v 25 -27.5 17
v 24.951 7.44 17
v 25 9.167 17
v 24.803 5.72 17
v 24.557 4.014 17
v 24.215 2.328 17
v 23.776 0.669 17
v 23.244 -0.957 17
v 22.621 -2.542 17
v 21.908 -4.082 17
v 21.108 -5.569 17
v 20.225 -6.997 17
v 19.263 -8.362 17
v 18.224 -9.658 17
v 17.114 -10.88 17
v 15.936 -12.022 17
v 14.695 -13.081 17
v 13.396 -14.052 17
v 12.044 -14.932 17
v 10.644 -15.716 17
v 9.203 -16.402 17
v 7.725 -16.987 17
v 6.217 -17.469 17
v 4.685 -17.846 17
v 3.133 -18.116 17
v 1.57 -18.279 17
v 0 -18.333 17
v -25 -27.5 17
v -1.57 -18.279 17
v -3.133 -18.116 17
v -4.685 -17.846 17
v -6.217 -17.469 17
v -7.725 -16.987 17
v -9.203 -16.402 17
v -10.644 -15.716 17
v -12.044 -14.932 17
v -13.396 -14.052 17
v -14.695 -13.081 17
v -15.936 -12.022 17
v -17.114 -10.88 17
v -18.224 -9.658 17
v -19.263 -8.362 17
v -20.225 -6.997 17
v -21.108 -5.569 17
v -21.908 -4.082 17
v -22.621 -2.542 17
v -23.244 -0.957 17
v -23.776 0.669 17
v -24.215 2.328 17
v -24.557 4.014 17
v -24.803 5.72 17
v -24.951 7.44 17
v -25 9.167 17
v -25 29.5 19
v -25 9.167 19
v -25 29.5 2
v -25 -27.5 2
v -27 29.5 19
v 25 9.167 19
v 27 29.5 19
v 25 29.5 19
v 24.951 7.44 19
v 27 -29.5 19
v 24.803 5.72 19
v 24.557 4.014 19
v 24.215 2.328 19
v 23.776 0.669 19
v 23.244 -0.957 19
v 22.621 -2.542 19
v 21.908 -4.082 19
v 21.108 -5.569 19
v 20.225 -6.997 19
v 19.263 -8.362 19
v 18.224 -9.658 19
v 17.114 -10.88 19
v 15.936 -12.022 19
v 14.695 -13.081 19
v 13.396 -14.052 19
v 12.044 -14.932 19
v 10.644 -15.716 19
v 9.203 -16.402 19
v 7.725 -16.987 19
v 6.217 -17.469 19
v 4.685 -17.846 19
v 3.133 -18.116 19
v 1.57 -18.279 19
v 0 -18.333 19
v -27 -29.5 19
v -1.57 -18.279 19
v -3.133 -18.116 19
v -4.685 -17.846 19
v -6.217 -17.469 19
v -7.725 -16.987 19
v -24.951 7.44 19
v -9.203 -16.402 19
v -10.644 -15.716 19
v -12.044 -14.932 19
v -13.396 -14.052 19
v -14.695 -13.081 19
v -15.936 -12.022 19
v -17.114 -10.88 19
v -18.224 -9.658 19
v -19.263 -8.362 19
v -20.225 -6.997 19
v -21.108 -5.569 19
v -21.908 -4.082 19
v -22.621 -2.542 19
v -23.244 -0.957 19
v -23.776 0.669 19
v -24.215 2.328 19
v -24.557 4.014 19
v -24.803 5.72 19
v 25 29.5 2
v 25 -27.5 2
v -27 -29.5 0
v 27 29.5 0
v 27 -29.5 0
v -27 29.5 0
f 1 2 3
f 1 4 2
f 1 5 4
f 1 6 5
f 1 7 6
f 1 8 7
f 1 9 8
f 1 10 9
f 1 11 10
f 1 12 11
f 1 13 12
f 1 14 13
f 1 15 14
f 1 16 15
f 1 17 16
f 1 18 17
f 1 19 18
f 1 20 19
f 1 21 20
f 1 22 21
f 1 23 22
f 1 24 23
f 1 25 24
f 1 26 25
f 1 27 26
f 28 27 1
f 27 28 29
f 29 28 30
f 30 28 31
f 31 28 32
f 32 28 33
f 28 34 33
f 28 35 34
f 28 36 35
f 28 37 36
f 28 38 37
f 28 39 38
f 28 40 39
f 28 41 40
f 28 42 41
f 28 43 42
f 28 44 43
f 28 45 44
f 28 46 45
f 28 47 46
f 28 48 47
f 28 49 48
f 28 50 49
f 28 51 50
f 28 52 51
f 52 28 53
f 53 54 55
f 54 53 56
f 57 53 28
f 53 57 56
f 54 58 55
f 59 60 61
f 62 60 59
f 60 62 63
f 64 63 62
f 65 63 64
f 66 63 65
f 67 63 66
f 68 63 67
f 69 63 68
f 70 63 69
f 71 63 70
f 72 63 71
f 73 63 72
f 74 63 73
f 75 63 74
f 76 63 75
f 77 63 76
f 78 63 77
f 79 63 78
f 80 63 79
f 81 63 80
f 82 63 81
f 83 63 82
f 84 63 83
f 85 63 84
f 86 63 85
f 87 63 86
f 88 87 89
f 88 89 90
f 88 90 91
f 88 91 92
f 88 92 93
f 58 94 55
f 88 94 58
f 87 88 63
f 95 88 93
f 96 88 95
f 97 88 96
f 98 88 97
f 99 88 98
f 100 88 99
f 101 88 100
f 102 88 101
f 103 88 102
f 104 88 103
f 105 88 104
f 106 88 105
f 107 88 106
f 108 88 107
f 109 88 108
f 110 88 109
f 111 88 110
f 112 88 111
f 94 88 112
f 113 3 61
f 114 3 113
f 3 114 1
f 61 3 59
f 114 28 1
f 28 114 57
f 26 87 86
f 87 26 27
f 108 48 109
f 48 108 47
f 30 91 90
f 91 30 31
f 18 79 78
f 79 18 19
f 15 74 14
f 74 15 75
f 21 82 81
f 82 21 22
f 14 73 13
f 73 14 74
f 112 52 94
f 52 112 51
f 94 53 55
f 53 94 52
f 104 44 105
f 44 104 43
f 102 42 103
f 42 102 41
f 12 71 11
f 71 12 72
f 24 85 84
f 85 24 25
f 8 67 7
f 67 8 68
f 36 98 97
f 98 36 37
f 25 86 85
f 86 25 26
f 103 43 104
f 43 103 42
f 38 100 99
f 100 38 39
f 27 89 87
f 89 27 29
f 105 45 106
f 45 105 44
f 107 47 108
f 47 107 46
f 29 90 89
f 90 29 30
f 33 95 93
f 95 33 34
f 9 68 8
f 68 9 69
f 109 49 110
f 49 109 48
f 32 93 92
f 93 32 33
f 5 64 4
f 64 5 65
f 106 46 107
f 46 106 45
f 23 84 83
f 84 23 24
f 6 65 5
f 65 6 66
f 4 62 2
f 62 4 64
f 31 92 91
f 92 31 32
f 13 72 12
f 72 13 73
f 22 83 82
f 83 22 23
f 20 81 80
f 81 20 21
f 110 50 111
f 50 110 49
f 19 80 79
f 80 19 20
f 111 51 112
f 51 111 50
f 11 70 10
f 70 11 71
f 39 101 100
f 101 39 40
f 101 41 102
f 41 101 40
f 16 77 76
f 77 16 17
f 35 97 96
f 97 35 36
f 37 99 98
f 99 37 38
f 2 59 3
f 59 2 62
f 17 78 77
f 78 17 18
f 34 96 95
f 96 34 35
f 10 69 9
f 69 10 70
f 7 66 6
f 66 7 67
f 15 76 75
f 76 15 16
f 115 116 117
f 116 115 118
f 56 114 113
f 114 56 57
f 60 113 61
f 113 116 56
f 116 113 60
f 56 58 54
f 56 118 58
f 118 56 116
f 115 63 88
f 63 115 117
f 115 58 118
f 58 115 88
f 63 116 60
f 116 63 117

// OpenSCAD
$fn=100;
width=50;
height=55;
thicc=15;

wall_thicc=2;

linear_extrude(wall_thicc) {
    square([width,height+wall_thicc*2], true);
}

difference() {
    translate([0, 0, thicc+wall_thicc]) {
        linear_extrude(wall_thicc) {
            square([width,height], true);
        }
    }
    
    translate([0, height/6, thicc+wall_thicc-1]) {
        linear_extrude(wall_thicc+2) {
            resize([width,height])circle(d=width);
        }
    }

    translate([0, height/1.5, thicc+wall_thicc-1]) {
        linear_extrude(wall_thicc+2) {
            square([width,height],true);
            // circle([width,height], true);
        }
    }
}

linear_extrude(thicc+wall_thicc*2) {
    translate([width/2+wall_thicc/2, 0, 0]) {
        square([wall_thicc,height+wall_thicc*2], true);
    }

    translate([(width/2+wall_thicc/2)*-1, 0, 0]) {
        square([wall_thicc,height+wall_thicc*2], true);
    }

    translate([0, (height/2+wall_thicc/2)*-1, 0]) {
        square([width+wall_thicc*2,wall_thicc], true);
    }
    
}
